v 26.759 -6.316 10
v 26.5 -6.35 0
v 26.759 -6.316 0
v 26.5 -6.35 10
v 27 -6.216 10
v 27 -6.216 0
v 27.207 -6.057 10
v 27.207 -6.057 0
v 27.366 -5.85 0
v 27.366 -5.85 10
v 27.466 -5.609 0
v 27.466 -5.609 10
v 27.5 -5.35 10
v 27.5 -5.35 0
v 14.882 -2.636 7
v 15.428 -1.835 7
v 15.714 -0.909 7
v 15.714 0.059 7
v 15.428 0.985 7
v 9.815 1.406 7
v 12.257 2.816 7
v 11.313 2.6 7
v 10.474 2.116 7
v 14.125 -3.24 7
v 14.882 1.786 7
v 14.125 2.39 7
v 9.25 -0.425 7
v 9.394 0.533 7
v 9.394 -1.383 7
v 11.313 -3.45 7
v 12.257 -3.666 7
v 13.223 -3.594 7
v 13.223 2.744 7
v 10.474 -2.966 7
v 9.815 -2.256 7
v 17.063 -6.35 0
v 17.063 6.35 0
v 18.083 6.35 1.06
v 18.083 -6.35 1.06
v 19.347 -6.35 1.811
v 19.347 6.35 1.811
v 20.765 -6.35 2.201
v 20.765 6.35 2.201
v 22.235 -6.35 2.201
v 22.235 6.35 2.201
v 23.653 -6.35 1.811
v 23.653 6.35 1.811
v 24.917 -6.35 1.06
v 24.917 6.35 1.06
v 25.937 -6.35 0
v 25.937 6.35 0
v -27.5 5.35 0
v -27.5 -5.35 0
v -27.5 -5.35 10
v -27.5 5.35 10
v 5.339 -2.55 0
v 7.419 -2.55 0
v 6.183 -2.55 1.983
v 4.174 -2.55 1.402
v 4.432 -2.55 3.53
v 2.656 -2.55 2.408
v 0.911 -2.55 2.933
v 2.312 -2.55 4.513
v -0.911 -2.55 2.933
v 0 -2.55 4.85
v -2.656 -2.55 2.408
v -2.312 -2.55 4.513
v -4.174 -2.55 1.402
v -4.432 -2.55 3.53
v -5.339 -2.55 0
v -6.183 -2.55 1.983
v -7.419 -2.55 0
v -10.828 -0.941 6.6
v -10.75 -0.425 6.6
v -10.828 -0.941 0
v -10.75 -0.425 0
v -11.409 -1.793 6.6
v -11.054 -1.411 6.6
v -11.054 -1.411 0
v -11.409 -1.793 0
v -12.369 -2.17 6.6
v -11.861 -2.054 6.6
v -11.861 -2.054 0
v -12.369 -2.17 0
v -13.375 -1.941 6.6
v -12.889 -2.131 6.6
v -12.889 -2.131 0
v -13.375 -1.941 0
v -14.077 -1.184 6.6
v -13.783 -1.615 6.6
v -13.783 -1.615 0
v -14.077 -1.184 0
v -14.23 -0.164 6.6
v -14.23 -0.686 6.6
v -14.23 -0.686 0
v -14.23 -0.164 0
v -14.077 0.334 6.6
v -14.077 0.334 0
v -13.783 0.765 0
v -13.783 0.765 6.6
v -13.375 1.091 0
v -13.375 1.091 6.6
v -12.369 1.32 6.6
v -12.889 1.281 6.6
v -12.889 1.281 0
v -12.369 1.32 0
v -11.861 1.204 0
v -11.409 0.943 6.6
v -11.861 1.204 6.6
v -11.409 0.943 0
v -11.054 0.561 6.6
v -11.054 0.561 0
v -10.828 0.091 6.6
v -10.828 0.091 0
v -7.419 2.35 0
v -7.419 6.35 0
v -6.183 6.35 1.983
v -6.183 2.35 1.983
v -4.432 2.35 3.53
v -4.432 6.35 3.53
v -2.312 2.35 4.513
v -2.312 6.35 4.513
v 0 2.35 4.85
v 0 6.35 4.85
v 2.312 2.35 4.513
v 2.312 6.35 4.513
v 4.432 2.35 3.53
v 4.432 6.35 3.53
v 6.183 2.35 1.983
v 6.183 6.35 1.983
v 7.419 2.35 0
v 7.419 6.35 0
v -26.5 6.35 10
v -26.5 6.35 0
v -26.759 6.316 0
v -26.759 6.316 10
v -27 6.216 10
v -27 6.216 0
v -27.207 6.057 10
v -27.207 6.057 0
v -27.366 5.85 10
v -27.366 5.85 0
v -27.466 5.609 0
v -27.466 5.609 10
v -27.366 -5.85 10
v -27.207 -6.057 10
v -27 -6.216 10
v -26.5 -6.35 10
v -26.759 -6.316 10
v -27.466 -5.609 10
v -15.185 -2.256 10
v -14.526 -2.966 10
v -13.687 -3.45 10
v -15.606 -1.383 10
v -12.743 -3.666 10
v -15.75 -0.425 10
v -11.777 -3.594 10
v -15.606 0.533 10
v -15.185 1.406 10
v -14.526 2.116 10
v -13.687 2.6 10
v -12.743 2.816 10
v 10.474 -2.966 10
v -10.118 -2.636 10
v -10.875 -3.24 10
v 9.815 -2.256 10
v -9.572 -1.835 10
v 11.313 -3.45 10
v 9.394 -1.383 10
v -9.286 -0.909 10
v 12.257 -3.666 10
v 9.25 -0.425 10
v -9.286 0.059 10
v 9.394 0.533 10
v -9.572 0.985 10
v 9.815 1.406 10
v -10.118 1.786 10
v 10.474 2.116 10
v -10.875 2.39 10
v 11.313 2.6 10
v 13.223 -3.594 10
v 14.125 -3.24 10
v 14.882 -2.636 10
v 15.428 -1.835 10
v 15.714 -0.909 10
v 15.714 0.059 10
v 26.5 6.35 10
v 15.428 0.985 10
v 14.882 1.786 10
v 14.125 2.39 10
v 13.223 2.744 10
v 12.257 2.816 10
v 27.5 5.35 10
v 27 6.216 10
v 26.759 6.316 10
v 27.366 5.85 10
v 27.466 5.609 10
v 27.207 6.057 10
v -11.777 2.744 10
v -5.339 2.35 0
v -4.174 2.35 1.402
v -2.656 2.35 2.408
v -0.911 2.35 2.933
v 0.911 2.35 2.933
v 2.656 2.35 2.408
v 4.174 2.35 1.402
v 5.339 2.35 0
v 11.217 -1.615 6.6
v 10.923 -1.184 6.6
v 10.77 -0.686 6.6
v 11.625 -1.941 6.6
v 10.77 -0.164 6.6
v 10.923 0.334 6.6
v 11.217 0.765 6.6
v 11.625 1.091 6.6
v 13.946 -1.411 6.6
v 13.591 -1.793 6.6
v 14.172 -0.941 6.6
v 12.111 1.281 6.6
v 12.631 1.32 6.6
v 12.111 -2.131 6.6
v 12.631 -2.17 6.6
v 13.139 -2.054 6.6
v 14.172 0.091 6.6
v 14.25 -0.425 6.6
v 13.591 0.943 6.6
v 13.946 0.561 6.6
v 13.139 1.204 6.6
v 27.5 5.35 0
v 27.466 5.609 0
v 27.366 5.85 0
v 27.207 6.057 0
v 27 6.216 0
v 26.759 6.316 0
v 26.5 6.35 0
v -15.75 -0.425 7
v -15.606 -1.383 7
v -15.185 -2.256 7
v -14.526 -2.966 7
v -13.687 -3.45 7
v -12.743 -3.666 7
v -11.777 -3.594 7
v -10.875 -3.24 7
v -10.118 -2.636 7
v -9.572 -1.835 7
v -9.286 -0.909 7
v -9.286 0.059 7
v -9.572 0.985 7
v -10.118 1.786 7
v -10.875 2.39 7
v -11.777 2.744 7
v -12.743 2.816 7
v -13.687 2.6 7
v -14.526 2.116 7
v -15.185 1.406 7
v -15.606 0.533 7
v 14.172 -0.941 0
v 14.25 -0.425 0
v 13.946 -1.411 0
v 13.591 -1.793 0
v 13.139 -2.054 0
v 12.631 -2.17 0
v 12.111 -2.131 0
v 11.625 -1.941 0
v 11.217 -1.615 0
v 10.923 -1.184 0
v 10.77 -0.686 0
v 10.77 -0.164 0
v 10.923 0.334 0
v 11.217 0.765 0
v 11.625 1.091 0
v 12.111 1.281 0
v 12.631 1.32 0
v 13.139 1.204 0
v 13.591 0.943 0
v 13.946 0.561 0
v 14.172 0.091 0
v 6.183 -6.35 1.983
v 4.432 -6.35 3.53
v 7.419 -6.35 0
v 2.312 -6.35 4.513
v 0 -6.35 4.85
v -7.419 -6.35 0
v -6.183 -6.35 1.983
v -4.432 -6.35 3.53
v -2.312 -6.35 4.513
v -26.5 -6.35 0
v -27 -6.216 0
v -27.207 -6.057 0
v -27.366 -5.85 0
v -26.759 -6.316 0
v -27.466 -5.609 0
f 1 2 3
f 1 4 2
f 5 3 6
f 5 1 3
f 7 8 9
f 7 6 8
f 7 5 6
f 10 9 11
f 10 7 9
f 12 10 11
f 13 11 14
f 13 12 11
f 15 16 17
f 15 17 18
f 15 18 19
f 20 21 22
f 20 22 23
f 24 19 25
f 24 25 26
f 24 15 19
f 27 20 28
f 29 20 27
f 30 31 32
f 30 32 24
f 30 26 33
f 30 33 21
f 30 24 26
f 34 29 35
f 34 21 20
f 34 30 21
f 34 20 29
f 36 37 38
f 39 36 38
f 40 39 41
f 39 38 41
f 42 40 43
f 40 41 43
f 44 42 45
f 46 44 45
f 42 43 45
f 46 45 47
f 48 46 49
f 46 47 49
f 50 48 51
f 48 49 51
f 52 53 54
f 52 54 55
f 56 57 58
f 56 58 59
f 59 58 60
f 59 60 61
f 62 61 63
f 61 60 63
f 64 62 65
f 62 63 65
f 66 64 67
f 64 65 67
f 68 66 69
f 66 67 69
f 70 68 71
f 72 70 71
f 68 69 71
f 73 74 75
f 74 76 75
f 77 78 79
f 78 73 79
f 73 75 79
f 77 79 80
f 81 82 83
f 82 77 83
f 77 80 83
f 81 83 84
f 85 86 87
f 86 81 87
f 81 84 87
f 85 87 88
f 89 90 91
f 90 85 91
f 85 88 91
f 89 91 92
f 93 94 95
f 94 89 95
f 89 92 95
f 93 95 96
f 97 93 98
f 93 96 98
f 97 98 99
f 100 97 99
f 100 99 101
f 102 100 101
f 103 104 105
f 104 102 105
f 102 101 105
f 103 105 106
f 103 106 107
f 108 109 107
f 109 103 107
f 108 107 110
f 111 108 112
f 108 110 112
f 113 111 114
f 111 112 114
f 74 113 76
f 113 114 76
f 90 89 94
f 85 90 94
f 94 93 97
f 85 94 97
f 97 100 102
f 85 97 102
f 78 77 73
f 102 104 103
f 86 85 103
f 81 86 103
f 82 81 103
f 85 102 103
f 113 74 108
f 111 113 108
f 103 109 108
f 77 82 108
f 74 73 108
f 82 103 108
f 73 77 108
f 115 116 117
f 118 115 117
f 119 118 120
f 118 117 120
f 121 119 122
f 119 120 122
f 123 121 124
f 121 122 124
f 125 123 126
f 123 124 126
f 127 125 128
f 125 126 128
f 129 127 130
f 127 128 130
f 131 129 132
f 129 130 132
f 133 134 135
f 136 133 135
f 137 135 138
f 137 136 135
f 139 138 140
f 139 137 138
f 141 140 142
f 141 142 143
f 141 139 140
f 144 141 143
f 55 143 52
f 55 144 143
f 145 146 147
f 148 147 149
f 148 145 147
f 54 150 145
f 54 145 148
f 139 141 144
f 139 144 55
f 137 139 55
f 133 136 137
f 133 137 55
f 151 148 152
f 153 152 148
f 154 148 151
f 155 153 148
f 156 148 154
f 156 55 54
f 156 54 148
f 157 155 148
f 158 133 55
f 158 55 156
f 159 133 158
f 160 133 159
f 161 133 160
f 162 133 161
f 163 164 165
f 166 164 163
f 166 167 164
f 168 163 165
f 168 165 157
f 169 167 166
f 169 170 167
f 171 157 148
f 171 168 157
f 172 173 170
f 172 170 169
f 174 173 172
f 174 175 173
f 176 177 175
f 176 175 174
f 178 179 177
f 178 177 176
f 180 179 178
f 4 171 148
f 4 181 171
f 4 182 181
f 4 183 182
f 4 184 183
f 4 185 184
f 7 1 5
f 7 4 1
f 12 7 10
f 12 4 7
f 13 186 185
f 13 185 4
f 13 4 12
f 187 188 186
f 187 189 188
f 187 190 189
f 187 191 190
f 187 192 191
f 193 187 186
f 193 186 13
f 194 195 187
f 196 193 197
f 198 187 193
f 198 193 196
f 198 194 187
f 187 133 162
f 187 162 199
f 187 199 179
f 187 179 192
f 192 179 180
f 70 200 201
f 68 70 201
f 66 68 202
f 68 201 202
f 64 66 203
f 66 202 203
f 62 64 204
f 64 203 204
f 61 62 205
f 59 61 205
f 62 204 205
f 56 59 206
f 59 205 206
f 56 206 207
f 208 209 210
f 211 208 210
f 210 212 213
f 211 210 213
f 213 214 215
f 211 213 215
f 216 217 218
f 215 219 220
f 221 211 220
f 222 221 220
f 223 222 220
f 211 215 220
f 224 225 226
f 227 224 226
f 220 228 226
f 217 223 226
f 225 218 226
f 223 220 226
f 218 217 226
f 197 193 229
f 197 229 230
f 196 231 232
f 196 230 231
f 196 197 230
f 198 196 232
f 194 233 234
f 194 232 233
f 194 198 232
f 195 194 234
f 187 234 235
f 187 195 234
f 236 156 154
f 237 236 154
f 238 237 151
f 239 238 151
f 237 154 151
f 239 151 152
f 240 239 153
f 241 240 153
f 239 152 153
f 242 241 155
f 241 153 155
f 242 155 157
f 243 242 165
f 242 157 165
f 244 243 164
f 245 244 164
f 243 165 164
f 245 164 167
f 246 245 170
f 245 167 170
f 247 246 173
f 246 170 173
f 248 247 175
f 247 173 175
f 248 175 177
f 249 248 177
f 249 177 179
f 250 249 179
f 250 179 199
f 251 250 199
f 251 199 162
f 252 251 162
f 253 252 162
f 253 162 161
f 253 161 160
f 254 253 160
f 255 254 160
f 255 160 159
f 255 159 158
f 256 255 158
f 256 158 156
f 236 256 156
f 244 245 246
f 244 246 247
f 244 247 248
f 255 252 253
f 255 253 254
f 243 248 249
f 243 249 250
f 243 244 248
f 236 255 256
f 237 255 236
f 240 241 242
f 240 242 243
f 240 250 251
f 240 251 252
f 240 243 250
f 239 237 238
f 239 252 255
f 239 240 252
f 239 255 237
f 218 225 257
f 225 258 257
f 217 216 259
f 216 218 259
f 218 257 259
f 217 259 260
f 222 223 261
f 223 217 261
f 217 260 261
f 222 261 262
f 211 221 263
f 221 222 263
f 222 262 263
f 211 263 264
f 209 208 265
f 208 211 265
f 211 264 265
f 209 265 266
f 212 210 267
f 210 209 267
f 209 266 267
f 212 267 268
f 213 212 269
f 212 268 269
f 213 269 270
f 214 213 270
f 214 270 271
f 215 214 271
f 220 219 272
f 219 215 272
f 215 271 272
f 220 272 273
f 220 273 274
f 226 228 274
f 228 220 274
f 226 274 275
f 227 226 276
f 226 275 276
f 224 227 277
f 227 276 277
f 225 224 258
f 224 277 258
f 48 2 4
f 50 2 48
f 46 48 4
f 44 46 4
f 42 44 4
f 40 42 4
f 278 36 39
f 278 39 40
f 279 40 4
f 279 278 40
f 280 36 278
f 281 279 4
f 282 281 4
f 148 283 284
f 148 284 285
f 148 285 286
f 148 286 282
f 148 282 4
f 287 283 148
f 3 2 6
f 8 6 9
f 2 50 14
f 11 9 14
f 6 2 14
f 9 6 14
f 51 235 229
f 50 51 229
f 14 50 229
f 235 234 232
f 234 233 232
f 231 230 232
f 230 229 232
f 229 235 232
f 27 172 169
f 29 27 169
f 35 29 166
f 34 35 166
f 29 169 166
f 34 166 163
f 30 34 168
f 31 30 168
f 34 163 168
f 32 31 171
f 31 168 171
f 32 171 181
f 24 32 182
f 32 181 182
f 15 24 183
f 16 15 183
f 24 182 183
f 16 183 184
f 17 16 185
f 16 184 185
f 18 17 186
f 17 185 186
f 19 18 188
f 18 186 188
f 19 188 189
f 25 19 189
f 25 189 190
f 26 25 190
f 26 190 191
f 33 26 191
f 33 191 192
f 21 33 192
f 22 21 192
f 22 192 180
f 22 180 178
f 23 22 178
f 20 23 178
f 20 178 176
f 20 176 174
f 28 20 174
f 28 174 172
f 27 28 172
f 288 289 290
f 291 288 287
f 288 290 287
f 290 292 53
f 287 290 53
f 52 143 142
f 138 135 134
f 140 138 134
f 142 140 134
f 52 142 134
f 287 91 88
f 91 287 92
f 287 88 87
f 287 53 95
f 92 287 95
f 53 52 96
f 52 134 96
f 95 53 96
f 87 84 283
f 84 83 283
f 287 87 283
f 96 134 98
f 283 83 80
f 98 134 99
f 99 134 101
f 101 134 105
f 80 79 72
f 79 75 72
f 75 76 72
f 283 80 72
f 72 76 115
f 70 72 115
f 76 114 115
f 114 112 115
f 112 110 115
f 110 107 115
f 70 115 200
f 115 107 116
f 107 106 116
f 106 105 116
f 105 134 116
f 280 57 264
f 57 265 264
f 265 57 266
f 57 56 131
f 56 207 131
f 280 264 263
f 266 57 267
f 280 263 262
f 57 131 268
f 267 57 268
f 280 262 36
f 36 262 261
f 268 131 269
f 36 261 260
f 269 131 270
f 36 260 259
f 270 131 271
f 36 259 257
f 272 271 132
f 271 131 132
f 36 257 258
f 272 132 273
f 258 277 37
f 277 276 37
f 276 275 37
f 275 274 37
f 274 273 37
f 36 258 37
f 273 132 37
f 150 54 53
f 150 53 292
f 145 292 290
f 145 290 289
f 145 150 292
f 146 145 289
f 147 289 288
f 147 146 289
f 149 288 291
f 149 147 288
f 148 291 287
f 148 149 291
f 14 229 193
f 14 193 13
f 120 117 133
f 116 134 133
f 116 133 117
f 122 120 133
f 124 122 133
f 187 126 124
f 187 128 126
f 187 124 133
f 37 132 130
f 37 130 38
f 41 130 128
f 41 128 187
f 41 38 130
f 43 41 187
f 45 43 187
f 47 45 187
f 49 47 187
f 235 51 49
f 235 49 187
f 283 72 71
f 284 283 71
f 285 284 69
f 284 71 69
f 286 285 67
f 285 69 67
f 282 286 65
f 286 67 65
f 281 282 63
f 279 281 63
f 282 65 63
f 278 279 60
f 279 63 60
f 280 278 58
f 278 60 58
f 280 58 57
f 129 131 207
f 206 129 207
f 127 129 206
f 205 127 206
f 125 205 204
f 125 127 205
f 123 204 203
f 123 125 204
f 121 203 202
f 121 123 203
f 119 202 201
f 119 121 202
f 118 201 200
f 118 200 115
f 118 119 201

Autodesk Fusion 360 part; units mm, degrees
sketch "スケッチ1" plane through (0, 0, 0) normal (0, 0, 1) x (1, 0, 0)
  line L0 (-27.5, 6.35) -> (27.5, 6.35)
  line L1 (27.5, 6.35) -> (27.5, -6.35)
  line L2 (27.5, -6.35) -> (-27.5, -6.35)
  line L3 (-27.5, -6.35) -> (-27.5, 6.35)
  line L4 (-27.5, 6.35) -> (27.5, -6.35) construction
  line L5 (27.5, 6.35) -> (-27.5, -6.35) construction
  circle A0 centre (-12.5, -0.425) radius 1.75
  circle A1 centre (12.5, -0.425) radius 1.75
  dimension "d1" = 55
  dimension "d2" = 12.7
  dimension "d3" = 3.5
  dimension "d4" = 3.5
  dimension "d5" = 15
  dimension "d6" = 15
  dimension "d7" = 5.925
  dimension "d8" = 5.925
extrude "押し出し1" add sketch "スケッチ1" along normal blind 10 contours L0 L1 L2 L3 | A0 | A1
extrude "押し出し2" cut sketch "スケッチ1" along normal blind 6.6 contours A0 | A1
sketch "スケッチ2" plane through (0, 0, 10) normal (0, 0, 1) x (-1, 0, 0)
  line L0 (27.5, 6.35) -> (-27.5, 6.35)
  line L1 (-27.5, 6.35) -> (-27.5, -6.35)
  line L2 (-27.5, -6.35) -> (27.5, -6.35)
  line L3 (27.5, -6.35) -> (27.5, 6.35)
  circle A0 centre (12.5, 0.425) radius 3.25
  circle A1 centre (-12.5, 0.425) radius 3.25
  point P0 (12.5, 0.425)
  point P1 (-12.5, 0.425)
  dimension "d13" = 6.5
  dimension "d14" = 6.5
extrude "押し出し3" cut sketch "スケッチ2" against normal blind 3 contours A0 | A1
sketch "スケッチ3" plane through (0, 6.35, 0) normal (0, 1, 0) x (-1, 0, 0)
  line L0 (-27.5, 0) -> (27.5, 0)
  line L1 (27.5, 0) -> (27.5, 10)
  line L2 (27.5, 10) -> (-27.5, 10)
  line L3 (-27.5, 10) -> (-27.5, 0)
  circle A0 centre (0, -3.25) radius 8.1
  circle A1 centre (0, -3.25) radius 6.25
  line L4 (27.5, 0) -> (-27.5, 0)
  circle A2 centre (-21.5, -3.25) radius 5.5
  dimension "d17" = 16.2
  dimension "d18" = 12.5
  dimension "d19" = 3.25
  dimension "d20" = 11
  dimension "d21" = 3.25
  dimension "d22" = 6
extrude "押し出し4" cut sketch "スケッチ3" against normal through all contours L0 L4 A2 | L0 A1 L4 picked at (-20.9476, 1.4676) picked at (-0.812, 1.6265)
extrude "押し出し5" cut sketch "スケッチ3" against normal blind 4 contours L0 A0 A1 L4 picked at (-6.5437, 0.3454)
extrude "押し出し6" cut sketch "スケッチ3" against normal up to surface (3.8 mm away) from surface at -8.9 contours L0 A0 A1 L4 picked at (-6.5437, 0.3454)
fillet "フィレット1" radius 1 4 edges at (-27.5, -6.35, 5) (-27.5, 6.35, 5) (27.5, -6.35, 5) (27.5, 6.35, 5)
equation "d8 = d7"
